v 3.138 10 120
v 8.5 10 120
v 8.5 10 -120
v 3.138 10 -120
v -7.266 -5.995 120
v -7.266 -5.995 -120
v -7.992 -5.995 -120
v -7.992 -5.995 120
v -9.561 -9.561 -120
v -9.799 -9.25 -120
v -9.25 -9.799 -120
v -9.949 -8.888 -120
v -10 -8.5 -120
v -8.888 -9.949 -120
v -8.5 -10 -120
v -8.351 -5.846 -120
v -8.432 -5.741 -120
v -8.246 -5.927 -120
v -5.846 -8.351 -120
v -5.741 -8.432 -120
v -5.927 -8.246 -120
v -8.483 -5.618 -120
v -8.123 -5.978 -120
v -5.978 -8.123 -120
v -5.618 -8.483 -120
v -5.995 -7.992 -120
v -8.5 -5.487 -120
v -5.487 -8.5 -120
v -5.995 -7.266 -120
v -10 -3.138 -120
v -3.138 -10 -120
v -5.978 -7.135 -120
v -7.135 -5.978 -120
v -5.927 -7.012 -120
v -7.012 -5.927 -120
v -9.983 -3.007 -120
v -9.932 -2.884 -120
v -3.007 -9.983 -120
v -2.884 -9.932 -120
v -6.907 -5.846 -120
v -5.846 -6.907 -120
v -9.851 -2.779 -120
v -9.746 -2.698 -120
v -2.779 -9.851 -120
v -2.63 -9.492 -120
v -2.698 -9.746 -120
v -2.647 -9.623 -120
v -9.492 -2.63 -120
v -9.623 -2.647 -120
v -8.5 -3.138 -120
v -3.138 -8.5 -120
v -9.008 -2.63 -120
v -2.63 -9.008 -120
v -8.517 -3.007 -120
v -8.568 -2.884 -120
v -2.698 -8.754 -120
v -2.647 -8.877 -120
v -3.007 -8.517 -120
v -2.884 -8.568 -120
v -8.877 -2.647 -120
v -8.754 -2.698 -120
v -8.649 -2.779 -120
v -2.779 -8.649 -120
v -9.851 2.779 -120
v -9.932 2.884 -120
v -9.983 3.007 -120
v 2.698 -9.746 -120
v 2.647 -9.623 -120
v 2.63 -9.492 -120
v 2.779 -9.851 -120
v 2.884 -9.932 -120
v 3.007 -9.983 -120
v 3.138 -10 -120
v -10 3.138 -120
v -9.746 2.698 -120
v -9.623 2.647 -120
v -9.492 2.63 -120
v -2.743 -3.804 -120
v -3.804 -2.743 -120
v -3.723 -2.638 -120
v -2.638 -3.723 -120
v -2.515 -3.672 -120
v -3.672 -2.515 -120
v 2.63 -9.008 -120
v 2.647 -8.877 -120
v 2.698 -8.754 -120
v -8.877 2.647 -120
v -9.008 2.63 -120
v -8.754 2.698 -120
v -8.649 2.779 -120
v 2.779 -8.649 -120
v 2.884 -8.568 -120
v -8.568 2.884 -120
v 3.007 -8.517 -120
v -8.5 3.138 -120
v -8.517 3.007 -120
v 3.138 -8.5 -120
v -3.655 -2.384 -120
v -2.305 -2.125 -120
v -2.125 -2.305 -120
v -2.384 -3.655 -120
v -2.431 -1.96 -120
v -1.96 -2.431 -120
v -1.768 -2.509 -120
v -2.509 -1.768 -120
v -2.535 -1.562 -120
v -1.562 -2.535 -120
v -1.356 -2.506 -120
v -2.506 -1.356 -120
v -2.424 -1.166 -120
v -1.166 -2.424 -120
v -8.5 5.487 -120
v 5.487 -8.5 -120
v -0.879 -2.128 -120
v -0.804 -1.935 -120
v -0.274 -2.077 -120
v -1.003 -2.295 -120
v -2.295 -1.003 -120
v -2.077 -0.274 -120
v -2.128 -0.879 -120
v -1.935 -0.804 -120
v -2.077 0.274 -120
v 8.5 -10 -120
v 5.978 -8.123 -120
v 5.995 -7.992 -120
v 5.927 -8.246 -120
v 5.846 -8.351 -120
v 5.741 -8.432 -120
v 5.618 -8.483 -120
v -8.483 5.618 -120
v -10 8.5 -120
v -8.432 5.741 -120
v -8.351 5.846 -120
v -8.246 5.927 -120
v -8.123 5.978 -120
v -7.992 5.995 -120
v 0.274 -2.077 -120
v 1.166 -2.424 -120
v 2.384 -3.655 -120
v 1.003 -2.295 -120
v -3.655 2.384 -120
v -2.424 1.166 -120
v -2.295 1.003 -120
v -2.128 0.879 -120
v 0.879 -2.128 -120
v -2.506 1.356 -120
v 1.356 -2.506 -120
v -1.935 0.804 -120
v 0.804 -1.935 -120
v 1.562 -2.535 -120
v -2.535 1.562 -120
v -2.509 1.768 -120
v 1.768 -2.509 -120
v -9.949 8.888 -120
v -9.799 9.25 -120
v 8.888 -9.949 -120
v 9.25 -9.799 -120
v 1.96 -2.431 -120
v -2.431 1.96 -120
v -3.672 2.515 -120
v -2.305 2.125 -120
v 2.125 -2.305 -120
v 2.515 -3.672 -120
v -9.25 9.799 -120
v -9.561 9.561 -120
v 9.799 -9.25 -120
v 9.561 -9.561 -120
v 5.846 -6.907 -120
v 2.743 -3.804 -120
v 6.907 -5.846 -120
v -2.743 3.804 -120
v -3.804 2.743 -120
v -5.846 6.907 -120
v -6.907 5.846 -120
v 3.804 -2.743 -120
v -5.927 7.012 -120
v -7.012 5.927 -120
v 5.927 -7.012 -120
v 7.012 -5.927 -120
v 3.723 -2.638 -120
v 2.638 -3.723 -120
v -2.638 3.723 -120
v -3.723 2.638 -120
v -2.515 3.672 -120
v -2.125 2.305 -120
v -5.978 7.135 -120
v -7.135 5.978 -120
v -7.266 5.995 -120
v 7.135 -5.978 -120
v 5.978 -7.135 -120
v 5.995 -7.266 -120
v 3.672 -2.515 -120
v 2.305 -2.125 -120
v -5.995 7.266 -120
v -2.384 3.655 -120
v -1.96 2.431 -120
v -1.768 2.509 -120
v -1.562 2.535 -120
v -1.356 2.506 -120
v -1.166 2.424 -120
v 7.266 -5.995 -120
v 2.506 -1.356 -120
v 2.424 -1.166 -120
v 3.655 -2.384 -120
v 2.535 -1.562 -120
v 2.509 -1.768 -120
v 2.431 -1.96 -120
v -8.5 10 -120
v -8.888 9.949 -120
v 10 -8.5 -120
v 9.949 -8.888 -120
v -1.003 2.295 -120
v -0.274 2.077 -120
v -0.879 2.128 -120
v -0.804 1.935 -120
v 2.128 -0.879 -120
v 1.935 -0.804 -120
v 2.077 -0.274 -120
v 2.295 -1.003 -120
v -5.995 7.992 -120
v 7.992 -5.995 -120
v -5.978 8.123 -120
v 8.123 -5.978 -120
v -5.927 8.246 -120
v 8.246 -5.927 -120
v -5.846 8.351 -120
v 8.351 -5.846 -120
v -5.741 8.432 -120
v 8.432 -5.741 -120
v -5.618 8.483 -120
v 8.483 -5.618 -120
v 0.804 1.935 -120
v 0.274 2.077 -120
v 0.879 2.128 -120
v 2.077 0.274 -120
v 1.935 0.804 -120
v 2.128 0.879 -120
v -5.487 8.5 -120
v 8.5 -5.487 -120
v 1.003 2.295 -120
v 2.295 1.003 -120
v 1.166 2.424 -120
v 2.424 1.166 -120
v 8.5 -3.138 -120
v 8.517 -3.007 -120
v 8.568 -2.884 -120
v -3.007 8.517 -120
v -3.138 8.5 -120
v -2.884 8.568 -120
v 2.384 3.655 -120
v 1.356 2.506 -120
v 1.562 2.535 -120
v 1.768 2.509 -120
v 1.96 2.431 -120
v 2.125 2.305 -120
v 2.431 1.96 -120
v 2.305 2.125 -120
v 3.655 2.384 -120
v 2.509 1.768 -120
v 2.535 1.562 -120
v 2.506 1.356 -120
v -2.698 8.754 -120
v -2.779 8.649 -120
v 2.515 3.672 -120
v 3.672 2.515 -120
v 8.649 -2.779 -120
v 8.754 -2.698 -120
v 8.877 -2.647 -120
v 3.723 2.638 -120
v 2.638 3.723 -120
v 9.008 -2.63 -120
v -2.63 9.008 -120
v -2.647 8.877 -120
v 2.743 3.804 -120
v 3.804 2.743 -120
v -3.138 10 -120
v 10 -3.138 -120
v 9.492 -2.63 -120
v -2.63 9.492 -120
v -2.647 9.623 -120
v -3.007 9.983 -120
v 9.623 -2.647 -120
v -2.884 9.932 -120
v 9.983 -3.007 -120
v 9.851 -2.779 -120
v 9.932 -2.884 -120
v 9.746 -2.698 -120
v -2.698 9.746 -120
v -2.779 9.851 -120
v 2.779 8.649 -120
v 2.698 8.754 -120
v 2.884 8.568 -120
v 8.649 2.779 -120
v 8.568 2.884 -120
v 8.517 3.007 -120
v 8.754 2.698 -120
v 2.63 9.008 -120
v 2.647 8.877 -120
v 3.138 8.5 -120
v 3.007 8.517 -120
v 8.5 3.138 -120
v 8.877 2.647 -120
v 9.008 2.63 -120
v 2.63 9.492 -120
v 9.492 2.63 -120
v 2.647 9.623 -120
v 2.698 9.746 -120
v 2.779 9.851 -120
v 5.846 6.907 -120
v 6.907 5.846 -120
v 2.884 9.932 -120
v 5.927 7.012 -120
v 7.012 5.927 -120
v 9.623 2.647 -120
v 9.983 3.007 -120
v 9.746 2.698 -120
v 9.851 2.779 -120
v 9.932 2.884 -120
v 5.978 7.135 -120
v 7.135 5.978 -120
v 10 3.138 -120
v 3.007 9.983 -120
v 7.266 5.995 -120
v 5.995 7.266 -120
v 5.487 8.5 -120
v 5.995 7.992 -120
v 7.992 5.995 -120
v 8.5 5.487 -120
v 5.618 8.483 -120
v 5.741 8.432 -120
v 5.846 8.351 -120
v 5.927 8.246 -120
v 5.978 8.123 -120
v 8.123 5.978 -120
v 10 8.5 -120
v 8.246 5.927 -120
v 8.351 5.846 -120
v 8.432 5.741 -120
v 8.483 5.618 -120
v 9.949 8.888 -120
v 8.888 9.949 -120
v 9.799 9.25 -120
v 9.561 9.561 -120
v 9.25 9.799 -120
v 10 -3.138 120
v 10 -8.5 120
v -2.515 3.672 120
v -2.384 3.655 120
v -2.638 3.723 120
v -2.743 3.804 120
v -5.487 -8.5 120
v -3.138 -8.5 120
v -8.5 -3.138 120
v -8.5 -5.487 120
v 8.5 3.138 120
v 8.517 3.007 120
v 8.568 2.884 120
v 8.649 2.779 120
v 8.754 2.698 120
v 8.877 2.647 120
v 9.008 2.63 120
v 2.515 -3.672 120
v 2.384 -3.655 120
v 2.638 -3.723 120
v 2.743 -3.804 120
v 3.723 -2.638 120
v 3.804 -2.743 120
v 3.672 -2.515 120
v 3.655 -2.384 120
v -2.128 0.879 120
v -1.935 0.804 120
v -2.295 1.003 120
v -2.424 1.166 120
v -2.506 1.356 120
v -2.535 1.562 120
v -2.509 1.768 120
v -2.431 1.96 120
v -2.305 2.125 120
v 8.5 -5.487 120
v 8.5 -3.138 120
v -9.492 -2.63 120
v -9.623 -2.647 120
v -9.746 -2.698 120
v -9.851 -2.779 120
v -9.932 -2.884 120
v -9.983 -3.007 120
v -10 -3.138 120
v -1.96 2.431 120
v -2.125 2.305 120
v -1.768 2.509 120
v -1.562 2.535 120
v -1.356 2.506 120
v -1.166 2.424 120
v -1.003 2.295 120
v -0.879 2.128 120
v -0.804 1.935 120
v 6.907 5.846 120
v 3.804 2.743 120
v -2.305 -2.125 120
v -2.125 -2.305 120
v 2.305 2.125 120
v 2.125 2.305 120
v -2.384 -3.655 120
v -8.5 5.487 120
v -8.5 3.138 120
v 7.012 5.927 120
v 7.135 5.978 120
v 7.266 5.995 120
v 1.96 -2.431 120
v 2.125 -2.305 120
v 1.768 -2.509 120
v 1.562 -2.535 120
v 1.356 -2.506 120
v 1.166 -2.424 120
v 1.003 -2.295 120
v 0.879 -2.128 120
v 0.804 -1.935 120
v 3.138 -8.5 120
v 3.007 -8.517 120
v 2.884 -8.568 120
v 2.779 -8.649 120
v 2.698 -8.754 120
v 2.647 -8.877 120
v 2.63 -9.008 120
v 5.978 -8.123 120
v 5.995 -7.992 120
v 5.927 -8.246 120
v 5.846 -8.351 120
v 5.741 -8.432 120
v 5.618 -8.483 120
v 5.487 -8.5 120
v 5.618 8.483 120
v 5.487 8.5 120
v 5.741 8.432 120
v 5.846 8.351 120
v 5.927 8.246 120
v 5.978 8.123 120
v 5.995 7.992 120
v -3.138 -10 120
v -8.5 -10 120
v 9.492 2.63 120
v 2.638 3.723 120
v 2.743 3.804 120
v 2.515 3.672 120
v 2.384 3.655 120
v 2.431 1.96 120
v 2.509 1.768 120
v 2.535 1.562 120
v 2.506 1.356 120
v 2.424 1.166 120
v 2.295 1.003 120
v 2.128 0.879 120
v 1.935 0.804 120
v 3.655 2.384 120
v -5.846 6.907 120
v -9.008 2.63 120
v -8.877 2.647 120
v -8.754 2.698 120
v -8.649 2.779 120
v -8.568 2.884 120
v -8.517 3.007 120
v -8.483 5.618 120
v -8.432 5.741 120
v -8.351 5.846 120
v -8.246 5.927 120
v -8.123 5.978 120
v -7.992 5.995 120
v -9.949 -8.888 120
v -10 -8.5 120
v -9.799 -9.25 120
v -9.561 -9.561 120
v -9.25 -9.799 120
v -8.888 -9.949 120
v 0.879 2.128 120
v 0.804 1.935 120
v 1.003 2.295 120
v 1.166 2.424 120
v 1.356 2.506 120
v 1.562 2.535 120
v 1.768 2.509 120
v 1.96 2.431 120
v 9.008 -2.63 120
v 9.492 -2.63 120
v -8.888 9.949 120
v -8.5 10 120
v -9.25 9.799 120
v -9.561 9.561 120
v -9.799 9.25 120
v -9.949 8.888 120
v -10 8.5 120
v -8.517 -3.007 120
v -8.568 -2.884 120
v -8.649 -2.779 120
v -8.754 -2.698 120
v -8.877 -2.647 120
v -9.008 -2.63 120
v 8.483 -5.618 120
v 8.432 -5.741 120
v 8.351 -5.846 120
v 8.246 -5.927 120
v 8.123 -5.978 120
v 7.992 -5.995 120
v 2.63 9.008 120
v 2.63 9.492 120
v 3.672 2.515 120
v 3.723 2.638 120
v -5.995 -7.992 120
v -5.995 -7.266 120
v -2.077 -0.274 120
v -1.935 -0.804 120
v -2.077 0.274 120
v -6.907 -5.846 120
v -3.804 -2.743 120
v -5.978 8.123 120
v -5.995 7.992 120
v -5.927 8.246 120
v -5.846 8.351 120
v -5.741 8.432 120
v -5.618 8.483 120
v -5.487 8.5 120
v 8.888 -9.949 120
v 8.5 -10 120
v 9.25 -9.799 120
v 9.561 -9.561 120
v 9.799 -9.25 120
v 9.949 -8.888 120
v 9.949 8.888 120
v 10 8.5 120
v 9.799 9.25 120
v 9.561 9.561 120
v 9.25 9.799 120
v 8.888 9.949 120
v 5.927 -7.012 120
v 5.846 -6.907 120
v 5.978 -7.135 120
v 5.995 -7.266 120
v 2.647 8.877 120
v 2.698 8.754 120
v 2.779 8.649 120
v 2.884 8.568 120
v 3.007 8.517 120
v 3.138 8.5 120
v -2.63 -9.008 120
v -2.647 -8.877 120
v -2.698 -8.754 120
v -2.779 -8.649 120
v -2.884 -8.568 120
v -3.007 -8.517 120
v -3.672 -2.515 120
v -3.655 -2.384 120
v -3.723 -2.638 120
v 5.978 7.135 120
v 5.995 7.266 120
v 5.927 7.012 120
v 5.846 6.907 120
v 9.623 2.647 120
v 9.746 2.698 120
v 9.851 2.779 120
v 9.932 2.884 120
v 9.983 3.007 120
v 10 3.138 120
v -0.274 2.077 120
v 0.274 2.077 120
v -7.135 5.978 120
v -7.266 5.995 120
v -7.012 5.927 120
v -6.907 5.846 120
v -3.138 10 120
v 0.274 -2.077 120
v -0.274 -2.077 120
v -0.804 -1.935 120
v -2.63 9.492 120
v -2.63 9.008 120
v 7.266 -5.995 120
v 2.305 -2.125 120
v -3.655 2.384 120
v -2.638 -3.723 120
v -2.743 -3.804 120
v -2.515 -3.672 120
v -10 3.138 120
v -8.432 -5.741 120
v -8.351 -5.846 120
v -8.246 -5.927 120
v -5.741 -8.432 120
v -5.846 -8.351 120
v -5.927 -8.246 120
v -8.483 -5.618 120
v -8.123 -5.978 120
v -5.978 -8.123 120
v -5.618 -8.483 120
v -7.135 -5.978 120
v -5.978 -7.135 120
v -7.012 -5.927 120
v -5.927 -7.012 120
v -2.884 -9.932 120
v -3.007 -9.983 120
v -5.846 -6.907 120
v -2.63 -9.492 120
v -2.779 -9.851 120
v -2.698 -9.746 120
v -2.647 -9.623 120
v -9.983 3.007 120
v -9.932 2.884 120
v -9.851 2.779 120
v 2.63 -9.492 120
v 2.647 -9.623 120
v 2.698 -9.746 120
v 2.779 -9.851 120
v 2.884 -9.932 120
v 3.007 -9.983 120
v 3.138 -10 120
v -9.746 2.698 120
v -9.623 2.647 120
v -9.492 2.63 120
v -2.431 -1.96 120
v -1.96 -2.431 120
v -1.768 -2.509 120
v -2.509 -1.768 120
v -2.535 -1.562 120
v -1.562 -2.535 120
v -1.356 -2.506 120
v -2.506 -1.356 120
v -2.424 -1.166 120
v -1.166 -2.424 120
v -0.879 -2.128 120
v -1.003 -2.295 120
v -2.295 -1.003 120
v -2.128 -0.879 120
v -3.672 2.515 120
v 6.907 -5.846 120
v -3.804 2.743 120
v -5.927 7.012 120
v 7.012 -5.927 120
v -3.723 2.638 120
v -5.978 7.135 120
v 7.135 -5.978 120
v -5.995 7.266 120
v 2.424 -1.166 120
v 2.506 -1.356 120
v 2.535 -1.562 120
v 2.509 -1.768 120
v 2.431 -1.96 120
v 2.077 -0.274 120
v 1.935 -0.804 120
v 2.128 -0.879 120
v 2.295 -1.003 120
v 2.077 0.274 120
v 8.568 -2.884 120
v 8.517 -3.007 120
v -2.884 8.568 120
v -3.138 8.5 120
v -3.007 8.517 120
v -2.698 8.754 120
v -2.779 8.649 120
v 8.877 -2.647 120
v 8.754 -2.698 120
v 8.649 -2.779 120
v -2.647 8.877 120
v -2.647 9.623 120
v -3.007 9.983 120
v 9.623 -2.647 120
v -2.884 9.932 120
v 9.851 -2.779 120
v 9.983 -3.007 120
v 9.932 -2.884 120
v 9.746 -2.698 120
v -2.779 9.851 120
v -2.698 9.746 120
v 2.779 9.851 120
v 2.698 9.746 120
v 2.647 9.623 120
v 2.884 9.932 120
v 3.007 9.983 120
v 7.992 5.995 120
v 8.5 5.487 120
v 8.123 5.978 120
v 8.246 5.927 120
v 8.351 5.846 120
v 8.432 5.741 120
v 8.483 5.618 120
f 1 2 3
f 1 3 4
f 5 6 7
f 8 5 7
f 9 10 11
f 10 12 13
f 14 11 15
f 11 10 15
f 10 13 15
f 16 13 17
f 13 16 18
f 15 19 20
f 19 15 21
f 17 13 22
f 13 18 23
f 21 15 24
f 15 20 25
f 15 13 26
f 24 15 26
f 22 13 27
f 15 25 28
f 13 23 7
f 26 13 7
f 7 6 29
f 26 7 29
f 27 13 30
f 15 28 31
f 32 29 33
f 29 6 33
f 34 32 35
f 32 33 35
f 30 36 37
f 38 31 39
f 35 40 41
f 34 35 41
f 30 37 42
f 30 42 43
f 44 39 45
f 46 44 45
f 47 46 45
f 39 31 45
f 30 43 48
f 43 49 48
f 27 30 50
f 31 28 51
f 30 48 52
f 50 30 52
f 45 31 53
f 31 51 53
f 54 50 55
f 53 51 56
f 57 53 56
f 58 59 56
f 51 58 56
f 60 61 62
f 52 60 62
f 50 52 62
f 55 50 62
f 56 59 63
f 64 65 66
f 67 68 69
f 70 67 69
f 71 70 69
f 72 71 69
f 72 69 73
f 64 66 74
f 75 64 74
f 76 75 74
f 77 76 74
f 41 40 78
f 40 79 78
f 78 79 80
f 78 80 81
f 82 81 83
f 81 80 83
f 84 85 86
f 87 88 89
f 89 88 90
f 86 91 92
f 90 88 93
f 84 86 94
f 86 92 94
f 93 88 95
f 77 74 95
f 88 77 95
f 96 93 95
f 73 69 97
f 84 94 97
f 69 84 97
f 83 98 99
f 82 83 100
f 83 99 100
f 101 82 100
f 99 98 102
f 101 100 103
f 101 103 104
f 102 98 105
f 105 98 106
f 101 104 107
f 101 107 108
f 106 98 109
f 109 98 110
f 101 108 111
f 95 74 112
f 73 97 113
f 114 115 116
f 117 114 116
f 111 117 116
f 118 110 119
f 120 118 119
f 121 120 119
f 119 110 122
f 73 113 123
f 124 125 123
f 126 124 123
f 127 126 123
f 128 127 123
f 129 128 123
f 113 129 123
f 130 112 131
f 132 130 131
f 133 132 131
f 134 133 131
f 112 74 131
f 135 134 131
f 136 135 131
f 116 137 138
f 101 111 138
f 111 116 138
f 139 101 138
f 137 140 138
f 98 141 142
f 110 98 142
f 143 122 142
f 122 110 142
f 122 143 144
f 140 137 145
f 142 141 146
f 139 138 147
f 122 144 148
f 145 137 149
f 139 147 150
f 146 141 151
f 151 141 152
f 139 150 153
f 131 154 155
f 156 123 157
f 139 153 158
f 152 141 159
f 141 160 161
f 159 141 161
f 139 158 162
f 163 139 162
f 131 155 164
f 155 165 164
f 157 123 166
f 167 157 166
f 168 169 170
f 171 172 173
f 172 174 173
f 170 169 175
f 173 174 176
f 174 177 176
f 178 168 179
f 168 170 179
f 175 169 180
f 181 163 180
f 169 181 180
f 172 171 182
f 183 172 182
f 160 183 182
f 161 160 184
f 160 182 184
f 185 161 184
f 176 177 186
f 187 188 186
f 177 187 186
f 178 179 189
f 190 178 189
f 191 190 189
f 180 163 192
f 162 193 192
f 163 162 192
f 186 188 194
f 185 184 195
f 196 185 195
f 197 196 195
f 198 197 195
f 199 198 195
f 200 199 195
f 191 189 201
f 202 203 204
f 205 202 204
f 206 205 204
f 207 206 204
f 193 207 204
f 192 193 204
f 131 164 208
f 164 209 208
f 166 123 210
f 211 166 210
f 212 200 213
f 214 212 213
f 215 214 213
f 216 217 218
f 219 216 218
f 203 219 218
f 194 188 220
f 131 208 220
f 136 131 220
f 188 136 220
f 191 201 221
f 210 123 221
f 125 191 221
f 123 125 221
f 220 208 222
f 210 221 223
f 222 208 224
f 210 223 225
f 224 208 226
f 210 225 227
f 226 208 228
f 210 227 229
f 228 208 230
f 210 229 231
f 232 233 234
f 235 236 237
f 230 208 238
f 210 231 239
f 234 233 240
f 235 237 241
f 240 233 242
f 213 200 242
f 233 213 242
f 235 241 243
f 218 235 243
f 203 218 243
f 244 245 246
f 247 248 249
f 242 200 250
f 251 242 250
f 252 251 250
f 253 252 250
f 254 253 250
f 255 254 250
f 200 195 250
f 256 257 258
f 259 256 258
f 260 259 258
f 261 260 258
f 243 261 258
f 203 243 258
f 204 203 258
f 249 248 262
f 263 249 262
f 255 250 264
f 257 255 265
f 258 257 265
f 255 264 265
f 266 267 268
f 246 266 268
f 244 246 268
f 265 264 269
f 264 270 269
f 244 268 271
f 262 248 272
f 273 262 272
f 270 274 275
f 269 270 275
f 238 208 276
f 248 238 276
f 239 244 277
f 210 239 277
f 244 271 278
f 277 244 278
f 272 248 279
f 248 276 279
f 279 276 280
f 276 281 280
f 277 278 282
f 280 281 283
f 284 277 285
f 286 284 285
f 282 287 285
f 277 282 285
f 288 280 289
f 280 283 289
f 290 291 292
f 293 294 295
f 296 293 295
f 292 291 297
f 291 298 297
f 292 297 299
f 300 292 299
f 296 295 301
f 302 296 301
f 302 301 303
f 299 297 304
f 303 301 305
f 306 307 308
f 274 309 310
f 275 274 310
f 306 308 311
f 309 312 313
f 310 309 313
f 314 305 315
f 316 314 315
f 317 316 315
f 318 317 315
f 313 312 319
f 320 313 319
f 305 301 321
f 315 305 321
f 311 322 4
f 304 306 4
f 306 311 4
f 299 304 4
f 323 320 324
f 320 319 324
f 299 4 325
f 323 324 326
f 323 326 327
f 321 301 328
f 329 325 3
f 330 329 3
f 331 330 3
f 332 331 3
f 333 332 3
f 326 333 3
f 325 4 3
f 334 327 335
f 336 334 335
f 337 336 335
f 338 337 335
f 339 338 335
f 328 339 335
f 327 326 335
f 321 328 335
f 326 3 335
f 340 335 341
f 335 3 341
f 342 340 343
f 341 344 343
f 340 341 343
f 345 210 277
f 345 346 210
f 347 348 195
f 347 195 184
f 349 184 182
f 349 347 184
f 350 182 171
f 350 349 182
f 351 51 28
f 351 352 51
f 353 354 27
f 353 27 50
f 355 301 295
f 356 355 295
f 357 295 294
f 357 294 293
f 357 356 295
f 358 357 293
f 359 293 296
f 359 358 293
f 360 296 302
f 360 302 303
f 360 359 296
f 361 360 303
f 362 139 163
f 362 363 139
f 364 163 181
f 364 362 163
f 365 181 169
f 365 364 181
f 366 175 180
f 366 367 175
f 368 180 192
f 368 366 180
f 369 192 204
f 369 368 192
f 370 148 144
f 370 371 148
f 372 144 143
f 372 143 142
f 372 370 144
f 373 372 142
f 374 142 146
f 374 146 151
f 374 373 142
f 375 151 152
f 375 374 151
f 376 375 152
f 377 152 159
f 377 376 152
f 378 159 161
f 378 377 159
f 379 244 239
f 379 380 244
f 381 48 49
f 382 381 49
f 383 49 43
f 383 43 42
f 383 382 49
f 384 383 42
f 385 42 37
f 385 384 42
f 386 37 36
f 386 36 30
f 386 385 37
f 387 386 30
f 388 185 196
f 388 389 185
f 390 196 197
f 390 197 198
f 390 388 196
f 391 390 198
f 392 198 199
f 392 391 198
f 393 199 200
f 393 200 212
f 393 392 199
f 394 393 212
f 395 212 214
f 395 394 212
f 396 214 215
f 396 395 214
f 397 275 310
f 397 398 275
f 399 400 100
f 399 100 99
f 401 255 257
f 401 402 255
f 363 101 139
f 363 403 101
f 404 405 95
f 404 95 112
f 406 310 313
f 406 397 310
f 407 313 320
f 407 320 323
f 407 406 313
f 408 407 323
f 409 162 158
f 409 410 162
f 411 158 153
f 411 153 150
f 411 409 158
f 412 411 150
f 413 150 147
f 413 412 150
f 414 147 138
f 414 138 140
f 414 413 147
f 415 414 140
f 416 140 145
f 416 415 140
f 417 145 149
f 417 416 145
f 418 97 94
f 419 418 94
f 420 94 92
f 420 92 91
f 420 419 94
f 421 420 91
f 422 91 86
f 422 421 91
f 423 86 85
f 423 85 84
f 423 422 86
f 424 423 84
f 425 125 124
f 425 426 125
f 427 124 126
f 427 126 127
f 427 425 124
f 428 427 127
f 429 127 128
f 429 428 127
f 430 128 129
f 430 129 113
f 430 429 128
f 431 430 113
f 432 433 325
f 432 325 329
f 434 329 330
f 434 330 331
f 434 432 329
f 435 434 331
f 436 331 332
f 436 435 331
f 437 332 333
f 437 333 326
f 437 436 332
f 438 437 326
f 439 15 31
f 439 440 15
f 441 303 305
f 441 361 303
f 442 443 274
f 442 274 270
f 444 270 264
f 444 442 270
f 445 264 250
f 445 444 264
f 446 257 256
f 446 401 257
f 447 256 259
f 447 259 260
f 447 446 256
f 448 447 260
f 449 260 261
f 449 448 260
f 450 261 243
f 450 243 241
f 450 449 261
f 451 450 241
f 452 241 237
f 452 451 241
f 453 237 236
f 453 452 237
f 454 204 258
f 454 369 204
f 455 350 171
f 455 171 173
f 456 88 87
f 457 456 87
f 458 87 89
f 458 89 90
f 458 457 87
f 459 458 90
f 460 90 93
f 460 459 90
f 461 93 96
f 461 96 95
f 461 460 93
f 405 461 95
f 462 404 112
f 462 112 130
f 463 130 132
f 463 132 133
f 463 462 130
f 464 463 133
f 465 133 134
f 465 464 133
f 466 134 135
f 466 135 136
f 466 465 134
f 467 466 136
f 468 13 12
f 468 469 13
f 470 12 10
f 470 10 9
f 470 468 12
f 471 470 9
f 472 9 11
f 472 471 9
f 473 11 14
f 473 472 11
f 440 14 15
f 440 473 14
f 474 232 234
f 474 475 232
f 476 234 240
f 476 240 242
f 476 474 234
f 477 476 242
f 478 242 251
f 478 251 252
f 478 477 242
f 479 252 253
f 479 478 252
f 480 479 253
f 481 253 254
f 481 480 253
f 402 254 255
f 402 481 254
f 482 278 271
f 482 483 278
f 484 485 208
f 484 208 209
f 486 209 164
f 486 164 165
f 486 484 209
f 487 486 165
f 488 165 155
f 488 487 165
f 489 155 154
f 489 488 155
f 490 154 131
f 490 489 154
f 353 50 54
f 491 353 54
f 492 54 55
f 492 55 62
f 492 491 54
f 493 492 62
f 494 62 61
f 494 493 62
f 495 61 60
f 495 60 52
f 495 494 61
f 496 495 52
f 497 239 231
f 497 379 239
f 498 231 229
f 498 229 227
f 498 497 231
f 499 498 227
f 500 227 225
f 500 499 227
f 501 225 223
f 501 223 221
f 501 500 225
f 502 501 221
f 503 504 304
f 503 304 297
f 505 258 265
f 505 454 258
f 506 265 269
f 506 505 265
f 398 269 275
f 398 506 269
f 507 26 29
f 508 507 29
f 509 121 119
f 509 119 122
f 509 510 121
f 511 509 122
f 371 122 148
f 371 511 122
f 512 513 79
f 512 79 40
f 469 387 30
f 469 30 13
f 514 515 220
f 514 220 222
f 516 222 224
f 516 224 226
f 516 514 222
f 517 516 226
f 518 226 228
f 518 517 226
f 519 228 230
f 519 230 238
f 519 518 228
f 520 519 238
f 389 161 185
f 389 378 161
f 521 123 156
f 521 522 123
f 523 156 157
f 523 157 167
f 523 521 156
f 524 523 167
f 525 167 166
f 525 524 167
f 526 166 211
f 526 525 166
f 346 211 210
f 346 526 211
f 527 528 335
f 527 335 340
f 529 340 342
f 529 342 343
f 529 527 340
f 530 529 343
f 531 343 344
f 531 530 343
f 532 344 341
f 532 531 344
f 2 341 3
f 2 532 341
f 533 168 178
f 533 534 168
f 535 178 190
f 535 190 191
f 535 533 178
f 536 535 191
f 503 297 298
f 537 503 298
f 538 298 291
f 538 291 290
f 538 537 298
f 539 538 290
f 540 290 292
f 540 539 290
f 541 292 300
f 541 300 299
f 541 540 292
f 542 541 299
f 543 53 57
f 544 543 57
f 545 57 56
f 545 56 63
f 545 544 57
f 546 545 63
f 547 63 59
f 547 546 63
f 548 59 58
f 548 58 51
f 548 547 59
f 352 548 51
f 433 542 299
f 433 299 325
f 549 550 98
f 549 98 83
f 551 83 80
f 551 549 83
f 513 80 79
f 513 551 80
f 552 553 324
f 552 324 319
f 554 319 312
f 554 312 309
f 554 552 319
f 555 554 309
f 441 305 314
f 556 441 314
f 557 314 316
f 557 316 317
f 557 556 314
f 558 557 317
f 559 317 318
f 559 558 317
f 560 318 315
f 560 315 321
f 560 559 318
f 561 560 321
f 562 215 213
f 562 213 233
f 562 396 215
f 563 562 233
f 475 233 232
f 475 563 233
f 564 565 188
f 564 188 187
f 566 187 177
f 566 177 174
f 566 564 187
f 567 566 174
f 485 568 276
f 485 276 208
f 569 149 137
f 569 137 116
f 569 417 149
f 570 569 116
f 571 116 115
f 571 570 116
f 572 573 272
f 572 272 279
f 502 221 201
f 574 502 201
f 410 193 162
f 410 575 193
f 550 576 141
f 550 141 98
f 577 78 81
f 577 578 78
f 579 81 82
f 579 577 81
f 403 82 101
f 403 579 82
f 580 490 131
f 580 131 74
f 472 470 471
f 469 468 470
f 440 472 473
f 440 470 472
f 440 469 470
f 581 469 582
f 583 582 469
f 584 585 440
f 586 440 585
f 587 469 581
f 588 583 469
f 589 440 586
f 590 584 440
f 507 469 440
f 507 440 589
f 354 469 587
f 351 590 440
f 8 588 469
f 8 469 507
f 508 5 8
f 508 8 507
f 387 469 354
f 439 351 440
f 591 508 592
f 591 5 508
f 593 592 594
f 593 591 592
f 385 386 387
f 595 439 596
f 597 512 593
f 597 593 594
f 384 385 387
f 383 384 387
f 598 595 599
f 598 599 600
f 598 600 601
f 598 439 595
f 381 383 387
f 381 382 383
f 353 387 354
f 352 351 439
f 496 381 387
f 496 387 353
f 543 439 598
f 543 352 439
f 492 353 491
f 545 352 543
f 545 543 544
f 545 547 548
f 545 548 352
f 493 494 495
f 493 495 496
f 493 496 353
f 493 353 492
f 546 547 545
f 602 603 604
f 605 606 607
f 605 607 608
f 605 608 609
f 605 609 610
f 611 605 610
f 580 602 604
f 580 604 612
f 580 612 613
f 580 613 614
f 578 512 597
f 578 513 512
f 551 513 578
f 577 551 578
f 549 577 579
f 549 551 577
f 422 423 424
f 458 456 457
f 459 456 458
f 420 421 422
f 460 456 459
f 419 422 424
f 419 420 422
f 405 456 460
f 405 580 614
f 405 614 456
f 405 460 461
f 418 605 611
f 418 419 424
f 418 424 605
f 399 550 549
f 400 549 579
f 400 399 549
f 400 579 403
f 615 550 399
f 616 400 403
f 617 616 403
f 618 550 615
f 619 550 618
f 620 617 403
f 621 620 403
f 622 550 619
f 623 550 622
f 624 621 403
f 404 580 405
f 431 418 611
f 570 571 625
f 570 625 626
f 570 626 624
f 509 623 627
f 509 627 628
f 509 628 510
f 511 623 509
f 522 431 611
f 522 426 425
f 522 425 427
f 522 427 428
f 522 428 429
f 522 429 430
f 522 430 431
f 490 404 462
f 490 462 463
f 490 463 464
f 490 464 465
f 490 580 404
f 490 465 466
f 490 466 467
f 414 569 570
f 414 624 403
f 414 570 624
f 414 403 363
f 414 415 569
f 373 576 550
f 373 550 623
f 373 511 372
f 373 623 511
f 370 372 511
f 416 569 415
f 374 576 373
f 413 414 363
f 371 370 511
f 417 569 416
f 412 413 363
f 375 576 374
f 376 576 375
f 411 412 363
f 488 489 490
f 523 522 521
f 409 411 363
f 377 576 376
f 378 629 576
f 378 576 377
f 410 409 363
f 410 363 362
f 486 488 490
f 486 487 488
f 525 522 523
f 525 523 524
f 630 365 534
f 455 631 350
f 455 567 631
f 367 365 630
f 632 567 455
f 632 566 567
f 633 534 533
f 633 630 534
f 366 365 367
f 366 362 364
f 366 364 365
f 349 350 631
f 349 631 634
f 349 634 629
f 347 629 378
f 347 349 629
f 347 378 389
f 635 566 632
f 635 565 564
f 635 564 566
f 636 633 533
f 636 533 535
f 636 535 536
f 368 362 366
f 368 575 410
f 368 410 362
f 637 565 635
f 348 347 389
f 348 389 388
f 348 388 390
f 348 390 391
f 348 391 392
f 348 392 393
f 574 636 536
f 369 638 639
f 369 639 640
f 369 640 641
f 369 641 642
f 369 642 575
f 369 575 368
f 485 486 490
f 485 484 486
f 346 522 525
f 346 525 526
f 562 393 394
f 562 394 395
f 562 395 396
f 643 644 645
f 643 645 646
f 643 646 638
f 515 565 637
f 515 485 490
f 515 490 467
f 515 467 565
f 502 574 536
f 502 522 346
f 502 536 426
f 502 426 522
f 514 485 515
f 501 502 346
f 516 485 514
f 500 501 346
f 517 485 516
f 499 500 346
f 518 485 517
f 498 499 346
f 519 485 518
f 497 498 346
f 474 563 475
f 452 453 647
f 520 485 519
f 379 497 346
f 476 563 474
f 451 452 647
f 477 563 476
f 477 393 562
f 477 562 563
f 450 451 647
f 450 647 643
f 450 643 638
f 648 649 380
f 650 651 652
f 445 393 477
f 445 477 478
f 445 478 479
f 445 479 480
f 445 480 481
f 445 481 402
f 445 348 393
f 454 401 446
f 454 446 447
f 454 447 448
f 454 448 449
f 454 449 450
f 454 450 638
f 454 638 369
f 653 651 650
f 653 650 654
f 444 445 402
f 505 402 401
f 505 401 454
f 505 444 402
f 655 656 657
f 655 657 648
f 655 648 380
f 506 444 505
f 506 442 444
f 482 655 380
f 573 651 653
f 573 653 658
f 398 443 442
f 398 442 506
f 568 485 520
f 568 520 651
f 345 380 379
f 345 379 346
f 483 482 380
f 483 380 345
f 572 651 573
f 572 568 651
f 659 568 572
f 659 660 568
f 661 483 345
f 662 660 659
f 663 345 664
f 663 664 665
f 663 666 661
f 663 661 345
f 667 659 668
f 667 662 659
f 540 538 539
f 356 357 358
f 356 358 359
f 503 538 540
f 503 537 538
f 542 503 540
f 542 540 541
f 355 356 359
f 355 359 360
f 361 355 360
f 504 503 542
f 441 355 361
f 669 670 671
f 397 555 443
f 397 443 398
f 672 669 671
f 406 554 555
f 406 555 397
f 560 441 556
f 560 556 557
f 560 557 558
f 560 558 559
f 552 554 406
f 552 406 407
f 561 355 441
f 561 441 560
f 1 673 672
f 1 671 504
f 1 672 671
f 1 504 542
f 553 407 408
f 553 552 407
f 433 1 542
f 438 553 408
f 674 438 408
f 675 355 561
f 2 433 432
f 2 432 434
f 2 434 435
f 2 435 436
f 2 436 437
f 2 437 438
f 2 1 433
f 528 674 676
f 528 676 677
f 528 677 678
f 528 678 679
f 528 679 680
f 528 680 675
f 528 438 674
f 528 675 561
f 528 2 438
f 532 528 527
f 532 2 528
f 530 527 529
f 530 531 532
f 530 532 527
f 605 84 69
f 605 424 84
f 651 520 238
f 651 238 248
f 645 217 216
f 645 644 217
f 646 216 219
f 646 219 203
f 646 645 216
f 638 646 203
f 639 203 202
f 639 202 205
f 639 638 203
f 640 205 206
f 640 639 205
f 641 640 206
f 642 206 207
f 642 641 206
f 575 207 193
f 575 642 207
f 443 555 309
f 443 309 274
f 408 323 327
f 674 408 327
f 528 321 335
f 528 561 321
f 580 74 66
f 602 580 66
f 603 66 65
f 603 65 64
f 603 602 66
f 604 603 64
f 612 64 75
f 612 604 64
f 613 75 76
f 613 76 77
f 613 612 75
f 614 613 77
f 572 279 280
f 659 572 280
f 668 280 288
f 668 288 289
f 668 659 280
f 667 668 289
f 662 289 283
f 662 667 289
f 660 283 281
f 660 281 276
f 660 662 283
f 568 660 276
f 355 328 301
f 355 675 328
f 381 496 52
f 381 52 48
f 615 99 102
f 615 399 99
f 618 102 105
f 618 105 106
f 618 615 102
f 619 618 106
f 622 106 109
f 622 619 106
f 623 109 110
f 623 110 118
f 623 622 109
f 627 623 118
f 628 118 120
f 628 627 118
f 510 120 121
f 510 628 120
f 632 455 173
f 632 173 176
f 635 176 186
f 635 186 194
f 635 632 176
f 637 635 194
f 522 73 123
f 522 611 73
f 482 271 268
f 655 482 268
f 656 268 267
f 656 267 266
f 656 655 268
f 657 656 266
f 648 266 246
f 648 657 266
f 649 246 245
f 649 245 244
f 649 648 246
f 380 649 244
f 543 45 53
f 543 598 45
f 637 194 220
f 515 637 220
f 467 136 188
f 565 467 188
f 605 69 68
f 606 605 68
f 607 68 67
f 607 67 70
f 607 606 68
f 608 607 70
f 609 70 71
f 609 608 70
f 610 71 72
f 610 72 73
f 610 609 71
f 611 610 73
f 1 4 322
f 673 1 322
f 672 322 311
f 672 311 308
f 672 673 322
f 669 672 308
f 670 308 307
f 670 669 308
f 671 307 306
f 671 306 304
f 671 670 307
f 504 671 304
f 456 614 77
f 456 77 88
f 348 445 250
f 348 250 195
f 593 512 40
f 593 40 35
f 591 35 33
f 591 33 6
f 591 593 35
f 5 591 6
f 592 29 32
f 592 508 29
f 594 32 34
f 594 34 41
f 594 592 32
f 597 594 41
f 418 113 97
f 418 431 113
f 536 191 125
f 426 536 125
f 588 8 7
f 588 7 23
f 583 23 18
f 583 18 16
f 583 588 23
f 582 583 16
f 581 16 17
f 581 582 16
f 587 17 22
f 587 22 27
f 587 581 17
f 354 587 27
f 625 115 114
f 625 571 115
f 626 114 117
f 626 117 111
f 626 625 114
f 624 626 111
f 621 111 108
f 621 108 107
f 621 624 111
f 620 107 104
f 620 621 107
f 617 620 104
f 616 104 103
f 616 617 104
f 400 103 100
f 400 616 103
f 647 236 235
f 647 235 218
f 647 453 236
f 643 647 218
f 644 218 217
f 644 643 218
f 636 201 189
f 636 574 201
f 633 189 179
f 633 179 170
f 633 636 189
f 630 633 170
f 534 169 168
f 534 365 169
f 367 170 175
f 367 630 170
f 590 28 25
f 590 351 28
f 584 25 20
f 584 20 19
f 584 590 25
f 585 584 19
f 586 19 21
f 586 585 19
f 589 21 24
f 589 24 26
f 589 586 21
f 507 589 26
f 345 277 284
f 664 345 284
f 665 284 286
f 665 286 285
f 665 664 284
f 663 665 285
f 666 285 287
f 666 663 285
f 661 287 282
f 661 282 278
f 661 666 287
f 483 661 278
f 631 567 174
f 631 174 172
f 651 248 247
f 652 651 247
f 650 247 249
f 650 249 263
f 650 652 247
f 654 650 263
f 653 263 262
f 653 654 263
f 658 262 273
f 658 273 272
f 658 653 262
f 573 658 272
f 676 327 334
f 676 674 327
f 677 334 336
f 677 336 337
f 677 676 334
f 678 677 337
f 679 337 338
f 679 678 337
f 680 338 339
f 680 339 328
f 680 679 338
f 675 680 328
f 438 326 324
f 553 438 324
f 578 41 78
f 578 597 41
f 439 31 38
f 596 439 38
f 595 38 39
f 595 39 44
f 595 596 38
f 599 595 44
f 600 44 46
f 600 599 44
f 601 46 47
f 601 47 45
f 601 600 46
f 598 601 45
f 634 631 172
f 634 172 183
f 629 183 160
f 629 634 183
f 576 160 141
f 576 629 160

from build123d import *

# Parameters (mm, degrees)
BOSS_EXTRUDE1_DEPTH = 120


with BuildPart() as part:
    # Sketch1 → Boss-Extrude1 (new, symmetric)
    with BuildSketch(Plane.XY):
        with BuildLine():
            Line((10, 3.138), (10, 8.5))
            ThreePointArc((10, 8.5), (9.560660172, 9.560660172), (8.5, 10))
            Line((8.5, 10), (3.138, 10))
            ThreePointArc((3.138, 10), (2.778789755, 9.851210245), (2.63, 9.492))
            Line((2.63, 9.492), (2.63, 9.008))
            ThreePointArc((2.63, 9.008), (2.778789755, 8.648789755), (3.138, 8.5))
            Line((3.138, 8.5), (5.487, 8.5))
            ThreePointArc((5.487, 8.5), (5.846210245, 8.351210245), (5.995, 7.992))
            Line((5.995, 7.992), (5.995, 7.266080661))
            ThreePointArc((5.995, 7.266080661), (5.956330803, 7.071677478), (5.846210245, 6.906870417))
            Line((5.846210245, 6.906870417), (2.743129583, 3.803789755))
            ThreePointArc((2.743129583, 3.803789755), (2.578322522, 3.693669197), (2.383919339, 3.655))
            Line((2.383919339, 3.655), (-2.383919339, 3.655))
            ThreePointArc((-2.383919339, 3.655), (-2.578322522, 3.693669197), (-2.743129583, 3.803789755))
            Line((-2.743129583, 3.803789755), (-5.846210245, 6.906870417))
            ThreePointArc((-5.846210245, 6.906870417), (-5.956330803, 7.071677478), (-5.995, 7.266080661))
            Line((-5.995, 7.266080661), (-5.995, 7.992))
            ThreePointArc((-5.995, 7.992), (-5.846210245, 8.351210245), (-5.487, 8.5))
            Line((-5.487, 8.5), (-3.138, 8.5))
            ThreePointArc((-3.138, 8.5), (-2.778789755, 8.648789755), (-2.63, 9.008))
            Line((-2.63, 9.008), (-2.63, 9.492))
            ThreePointArc((-2.63, 9.492), (-2.778789755, 9.851210245), (-3.138, 10))
            Line((-3.138, 10), (-8.5, 10))
            ThreePointArc((-8.5, 10), (-9.560660172, 9.560660172), (-10, 8.5))
            Line((-10, 8.5), (-10, 3.138))
            ThreePointArc((-10, 3.138), (-9.851210245, 2.778789755), (-9.492, 2.63))
            Line((-9.492, 2.63), (-9.008, 2.63))
            ThreePointArc((-9.008, 2.63), (-8.648789755, 2.778789755), (-8.5, 3.138))
            Line((-8.5, 3.138), (-8.5, 5.487))
            ThreePointArc((-8.5, 5.487), (-8.351210245, 5.846210245), (-7.992, 5.995))
            Line((-7.992, 5.995), (-7.266080661, 5.995))
            ThreePointArc((-7.266080661, 5.995), (-7.071677478, 5.956330803), (-6.906870417, 5.846210245))
            Line((-6.906870417, 5.846210245), (-3.803789755, 2.743129583))
            ThreePointArc((-3.803789755, 2.743129583), (-3.693669197, 2.578322522), (-3.655, 2.383919339))
            Line((-3.655, 2.383919339), (-3.655, -2.383919339))
            ThreePointArc((-3.655, -2.383919339), (-3.693669197, -2.578322522), (-3.803789755, -2.743129583))
            Line((-3.803789755, -2.743129583), (-6.906870417, -5.846210245))
            ThreePointArc((-6.906870417, -5.846210245), (-7.071677478, -5.956330803), (-7.266080661, -5.995))
            Line((-7.266080661, -5.995), (-7.992, -5.995))
            ThreePointArc((-7.992, -5.995), (-8.351210245, -5.846210245), (-8.5, -5.487))
            Line((-8.5, -5.487), (-8.5, -3.138))
            ThreePointArc((-8.5, -3.138), (-8.648789755, -2.778789755), (-9.008, -2.63))
            Line((-9.008, -2.63), (-9.492, -2.63))
            ThreePointArc((-9.492, -2.63), (-9.851210245, -2.778789755), (-10, -3.138))
            Line((-10, -3.138), (-10, -8.5))
            ThreePointArc((-10, -8.5), (-9.560660172, -9.560660172), (-8.5, -10))
            Line((-8.5, -10), (-3.138, -10))
            ThreePointArc((-3.138, -10), (-2.778789755, -9.851210245), (-2.63, -9.492))
            Line((-2.63, -9.492), (-2.63, -9.008))
            ThreePointArc((-2.63, -9.008), (-2.778789755, -8.648789755), (-3.138, -8.5))
            Line((-3.138, -8.5), (-5.487, -8.5))
            ThreePointArc((-5.487, -8.5), (-5.846210245, -8.351210245), (-5.995, -7.992))
            Line((-5.995, -7.992), (-5.995, -7.266080661))
            ThreePointArc((-5.995, -7.266080661), (-5.956330803, -7.071677478), (-5.846210245, -6.906870417))
            Line((-5.846210245, -6.906870417), (-2.743129583, -3.803789755))
            ThreePointArc((-2.743129583, -3.803789755), (-2.578322522, -3.693669197), (-2.383919339, -3.655))
            Line((-2.383919339, -3.655), (2.383919339, -3.655))
            ThreePointArc((2.383919339, -3.655), (2.578322522, -3.693669197), (2.743129583, -3.803789755))
            Line((2.743129583, -3.803789755), (5.846210245, -6.906870417))
            ThreePointArc((5.846210245, -6.906870417), (5.956330803, -7.071677478), (5.995, -7.266080661))
            Line((5.995, -7.266080661), (5.995, -7.992))
            ThreePointArc((5.995, -7.992), (5.846210245, -8.351210245), (5.487, -8.5))
            Line((5.487, -8.5), (3.138, -8.5))
            ThreePointArc((3.138, -8.5), (2.778789755, -8.648789755), (2.63, -9.008))
            Line((2.63, -9.008), (2.63, -9.492))
            ThreePointArc((2.63, -9.492), (2.778789755, -9.851210245), (3.138, -10))
            Line((3.138, -10), (8.5, -10))
            ThreePointArc((8.5, -10), (9.560660172, -9.560660172), (10, -8.5))
            Line((10, -8.5), (10, -3.138))
            ThreePointArc((10, -3.138), (9.851210245, -2.778789755), (9.492, -2.63))
            Line((9.492, -2.63), (9.008, -2.63))
            ThreePointArc((9.008, -2.63), (8.648789755, -2.778789755), (8.5, -3.138))
            Line((8.5, -3.138), (8.5, -5.487))
            ThreePointArc((8.5, -5.487), (8.351210245, -5.846210245), (7.992, -5.995))
            Line((7.992, -5.995), (7.266080661, -5.995))
            ThreePointArc((7.266080661, -5.995), (7.071677478, -5.956330803), (6.906870417, -5.846210245))
            Line((6.906870417, -5.846210245), (3.803789755, -2.743129583))
            ThreePointArc((3.803789755, -2.743129583), (3.693669197, -2.578322522), (3.655, -2.383919339))
            Line((3.655, -2.383919339), (3.655, 2.383919339))
            ThreePointArc((3.655, 2.383919339), (3.693669197, 2.578322522), (3.803789755, 2.743129583))
            Line((3.803789755, 2.743129583), (6.906870417, 5.846210245))
            ThreePointArc((6.906870417, 5.846210245), (7.071677478, 5.956330803), (7.266080661, 5.995))
            Line((7.266080661, 5.995), (7.992, 5.995))
            ThreePointArc((7.992, 5.995), (8.351210245, 5.846210245), (8.5, 5.487))
            Line((8.5, 5.487), (8.5, 3.138))
            ThreePointArc((8.5, 3.138), (8.648789755, 2.778789755), (9.008, 2.63))
            Line((9.008, 2.63), (9.492, 2.63))
            ThreePointArc((9.492, 2.63), (9.851210245, 2.778789755), (10, 3.138))
        make_face()
        with BuildLine():
            Line((-2.124900844, -2.304505966), (-2.304505966, -2.124900844))
            ThreePointArc((-2.304505966, -2.124900844), (-2.505938017, -1.356467811), (-1.935133506, -0.803976718))
            ThreePointArc((-1.935133506, -0.803976718), (-2.0955, 0), (-1.935133506, 0.803976718))
            ThreePointArc((-1.935133506, 0.803976718), (-2.505938017, 1.356467811), (-2.304505966, 2.124900844))
            Line((-2.304505966, 2.124900844), (-2.124900844, 2.304505966))
            ThreePointArc((-2.124900844, 2.304505966), (-1.356467811, 2.505938017), (-0.803976718, 1.935133506))
            ThreePointArc((-0.803976718, 1.935133506), (0, 2.0955), (0.803976718, 1.935133506))
            ThreePointArc((0.803976718, 1.935133506), (1.356467811, 2.505938017), (2.124900844, 2.304505966))
            Line((2.124900844, 2.304505966), (2.304505966, 2.124900844))
            ThreePointArc((2.304505966, 2.124900844), (2.505938017, 1.356467811), (1.935133506, 0.803976718))
            ThreePointArc((1.935133506, 0.803976718), (2.0955, 0), (1.935133506, -0.803976718))
            ThreePointArc((1.935133506, -0.803976718), (2.505938017, -1.356467811), (2.304505966, -2.124900844))
            Line((2.304505966, -2.124900844), (2.124900844, -2.304505966))
            ThreePointArc((2.124900844, -2.304505966), (1.356467811, -2.505938017), (0.803976718, -1.935133506))
            ThreePointArc((0.803976718, -1.935133506), (0, -2.0955), (-0.803976718, -1.935133506))
            ThreePointArc((-0.803976718, -1.935133506), (-1.356467811, -2.505938017), (-2.124900844, -2.304505966))
        make_face(mode=Mode.SUBTRACT)
    extrude(amount=BOSS_EXTRUDE1_DEPTH, both=True)


solid = part.part
